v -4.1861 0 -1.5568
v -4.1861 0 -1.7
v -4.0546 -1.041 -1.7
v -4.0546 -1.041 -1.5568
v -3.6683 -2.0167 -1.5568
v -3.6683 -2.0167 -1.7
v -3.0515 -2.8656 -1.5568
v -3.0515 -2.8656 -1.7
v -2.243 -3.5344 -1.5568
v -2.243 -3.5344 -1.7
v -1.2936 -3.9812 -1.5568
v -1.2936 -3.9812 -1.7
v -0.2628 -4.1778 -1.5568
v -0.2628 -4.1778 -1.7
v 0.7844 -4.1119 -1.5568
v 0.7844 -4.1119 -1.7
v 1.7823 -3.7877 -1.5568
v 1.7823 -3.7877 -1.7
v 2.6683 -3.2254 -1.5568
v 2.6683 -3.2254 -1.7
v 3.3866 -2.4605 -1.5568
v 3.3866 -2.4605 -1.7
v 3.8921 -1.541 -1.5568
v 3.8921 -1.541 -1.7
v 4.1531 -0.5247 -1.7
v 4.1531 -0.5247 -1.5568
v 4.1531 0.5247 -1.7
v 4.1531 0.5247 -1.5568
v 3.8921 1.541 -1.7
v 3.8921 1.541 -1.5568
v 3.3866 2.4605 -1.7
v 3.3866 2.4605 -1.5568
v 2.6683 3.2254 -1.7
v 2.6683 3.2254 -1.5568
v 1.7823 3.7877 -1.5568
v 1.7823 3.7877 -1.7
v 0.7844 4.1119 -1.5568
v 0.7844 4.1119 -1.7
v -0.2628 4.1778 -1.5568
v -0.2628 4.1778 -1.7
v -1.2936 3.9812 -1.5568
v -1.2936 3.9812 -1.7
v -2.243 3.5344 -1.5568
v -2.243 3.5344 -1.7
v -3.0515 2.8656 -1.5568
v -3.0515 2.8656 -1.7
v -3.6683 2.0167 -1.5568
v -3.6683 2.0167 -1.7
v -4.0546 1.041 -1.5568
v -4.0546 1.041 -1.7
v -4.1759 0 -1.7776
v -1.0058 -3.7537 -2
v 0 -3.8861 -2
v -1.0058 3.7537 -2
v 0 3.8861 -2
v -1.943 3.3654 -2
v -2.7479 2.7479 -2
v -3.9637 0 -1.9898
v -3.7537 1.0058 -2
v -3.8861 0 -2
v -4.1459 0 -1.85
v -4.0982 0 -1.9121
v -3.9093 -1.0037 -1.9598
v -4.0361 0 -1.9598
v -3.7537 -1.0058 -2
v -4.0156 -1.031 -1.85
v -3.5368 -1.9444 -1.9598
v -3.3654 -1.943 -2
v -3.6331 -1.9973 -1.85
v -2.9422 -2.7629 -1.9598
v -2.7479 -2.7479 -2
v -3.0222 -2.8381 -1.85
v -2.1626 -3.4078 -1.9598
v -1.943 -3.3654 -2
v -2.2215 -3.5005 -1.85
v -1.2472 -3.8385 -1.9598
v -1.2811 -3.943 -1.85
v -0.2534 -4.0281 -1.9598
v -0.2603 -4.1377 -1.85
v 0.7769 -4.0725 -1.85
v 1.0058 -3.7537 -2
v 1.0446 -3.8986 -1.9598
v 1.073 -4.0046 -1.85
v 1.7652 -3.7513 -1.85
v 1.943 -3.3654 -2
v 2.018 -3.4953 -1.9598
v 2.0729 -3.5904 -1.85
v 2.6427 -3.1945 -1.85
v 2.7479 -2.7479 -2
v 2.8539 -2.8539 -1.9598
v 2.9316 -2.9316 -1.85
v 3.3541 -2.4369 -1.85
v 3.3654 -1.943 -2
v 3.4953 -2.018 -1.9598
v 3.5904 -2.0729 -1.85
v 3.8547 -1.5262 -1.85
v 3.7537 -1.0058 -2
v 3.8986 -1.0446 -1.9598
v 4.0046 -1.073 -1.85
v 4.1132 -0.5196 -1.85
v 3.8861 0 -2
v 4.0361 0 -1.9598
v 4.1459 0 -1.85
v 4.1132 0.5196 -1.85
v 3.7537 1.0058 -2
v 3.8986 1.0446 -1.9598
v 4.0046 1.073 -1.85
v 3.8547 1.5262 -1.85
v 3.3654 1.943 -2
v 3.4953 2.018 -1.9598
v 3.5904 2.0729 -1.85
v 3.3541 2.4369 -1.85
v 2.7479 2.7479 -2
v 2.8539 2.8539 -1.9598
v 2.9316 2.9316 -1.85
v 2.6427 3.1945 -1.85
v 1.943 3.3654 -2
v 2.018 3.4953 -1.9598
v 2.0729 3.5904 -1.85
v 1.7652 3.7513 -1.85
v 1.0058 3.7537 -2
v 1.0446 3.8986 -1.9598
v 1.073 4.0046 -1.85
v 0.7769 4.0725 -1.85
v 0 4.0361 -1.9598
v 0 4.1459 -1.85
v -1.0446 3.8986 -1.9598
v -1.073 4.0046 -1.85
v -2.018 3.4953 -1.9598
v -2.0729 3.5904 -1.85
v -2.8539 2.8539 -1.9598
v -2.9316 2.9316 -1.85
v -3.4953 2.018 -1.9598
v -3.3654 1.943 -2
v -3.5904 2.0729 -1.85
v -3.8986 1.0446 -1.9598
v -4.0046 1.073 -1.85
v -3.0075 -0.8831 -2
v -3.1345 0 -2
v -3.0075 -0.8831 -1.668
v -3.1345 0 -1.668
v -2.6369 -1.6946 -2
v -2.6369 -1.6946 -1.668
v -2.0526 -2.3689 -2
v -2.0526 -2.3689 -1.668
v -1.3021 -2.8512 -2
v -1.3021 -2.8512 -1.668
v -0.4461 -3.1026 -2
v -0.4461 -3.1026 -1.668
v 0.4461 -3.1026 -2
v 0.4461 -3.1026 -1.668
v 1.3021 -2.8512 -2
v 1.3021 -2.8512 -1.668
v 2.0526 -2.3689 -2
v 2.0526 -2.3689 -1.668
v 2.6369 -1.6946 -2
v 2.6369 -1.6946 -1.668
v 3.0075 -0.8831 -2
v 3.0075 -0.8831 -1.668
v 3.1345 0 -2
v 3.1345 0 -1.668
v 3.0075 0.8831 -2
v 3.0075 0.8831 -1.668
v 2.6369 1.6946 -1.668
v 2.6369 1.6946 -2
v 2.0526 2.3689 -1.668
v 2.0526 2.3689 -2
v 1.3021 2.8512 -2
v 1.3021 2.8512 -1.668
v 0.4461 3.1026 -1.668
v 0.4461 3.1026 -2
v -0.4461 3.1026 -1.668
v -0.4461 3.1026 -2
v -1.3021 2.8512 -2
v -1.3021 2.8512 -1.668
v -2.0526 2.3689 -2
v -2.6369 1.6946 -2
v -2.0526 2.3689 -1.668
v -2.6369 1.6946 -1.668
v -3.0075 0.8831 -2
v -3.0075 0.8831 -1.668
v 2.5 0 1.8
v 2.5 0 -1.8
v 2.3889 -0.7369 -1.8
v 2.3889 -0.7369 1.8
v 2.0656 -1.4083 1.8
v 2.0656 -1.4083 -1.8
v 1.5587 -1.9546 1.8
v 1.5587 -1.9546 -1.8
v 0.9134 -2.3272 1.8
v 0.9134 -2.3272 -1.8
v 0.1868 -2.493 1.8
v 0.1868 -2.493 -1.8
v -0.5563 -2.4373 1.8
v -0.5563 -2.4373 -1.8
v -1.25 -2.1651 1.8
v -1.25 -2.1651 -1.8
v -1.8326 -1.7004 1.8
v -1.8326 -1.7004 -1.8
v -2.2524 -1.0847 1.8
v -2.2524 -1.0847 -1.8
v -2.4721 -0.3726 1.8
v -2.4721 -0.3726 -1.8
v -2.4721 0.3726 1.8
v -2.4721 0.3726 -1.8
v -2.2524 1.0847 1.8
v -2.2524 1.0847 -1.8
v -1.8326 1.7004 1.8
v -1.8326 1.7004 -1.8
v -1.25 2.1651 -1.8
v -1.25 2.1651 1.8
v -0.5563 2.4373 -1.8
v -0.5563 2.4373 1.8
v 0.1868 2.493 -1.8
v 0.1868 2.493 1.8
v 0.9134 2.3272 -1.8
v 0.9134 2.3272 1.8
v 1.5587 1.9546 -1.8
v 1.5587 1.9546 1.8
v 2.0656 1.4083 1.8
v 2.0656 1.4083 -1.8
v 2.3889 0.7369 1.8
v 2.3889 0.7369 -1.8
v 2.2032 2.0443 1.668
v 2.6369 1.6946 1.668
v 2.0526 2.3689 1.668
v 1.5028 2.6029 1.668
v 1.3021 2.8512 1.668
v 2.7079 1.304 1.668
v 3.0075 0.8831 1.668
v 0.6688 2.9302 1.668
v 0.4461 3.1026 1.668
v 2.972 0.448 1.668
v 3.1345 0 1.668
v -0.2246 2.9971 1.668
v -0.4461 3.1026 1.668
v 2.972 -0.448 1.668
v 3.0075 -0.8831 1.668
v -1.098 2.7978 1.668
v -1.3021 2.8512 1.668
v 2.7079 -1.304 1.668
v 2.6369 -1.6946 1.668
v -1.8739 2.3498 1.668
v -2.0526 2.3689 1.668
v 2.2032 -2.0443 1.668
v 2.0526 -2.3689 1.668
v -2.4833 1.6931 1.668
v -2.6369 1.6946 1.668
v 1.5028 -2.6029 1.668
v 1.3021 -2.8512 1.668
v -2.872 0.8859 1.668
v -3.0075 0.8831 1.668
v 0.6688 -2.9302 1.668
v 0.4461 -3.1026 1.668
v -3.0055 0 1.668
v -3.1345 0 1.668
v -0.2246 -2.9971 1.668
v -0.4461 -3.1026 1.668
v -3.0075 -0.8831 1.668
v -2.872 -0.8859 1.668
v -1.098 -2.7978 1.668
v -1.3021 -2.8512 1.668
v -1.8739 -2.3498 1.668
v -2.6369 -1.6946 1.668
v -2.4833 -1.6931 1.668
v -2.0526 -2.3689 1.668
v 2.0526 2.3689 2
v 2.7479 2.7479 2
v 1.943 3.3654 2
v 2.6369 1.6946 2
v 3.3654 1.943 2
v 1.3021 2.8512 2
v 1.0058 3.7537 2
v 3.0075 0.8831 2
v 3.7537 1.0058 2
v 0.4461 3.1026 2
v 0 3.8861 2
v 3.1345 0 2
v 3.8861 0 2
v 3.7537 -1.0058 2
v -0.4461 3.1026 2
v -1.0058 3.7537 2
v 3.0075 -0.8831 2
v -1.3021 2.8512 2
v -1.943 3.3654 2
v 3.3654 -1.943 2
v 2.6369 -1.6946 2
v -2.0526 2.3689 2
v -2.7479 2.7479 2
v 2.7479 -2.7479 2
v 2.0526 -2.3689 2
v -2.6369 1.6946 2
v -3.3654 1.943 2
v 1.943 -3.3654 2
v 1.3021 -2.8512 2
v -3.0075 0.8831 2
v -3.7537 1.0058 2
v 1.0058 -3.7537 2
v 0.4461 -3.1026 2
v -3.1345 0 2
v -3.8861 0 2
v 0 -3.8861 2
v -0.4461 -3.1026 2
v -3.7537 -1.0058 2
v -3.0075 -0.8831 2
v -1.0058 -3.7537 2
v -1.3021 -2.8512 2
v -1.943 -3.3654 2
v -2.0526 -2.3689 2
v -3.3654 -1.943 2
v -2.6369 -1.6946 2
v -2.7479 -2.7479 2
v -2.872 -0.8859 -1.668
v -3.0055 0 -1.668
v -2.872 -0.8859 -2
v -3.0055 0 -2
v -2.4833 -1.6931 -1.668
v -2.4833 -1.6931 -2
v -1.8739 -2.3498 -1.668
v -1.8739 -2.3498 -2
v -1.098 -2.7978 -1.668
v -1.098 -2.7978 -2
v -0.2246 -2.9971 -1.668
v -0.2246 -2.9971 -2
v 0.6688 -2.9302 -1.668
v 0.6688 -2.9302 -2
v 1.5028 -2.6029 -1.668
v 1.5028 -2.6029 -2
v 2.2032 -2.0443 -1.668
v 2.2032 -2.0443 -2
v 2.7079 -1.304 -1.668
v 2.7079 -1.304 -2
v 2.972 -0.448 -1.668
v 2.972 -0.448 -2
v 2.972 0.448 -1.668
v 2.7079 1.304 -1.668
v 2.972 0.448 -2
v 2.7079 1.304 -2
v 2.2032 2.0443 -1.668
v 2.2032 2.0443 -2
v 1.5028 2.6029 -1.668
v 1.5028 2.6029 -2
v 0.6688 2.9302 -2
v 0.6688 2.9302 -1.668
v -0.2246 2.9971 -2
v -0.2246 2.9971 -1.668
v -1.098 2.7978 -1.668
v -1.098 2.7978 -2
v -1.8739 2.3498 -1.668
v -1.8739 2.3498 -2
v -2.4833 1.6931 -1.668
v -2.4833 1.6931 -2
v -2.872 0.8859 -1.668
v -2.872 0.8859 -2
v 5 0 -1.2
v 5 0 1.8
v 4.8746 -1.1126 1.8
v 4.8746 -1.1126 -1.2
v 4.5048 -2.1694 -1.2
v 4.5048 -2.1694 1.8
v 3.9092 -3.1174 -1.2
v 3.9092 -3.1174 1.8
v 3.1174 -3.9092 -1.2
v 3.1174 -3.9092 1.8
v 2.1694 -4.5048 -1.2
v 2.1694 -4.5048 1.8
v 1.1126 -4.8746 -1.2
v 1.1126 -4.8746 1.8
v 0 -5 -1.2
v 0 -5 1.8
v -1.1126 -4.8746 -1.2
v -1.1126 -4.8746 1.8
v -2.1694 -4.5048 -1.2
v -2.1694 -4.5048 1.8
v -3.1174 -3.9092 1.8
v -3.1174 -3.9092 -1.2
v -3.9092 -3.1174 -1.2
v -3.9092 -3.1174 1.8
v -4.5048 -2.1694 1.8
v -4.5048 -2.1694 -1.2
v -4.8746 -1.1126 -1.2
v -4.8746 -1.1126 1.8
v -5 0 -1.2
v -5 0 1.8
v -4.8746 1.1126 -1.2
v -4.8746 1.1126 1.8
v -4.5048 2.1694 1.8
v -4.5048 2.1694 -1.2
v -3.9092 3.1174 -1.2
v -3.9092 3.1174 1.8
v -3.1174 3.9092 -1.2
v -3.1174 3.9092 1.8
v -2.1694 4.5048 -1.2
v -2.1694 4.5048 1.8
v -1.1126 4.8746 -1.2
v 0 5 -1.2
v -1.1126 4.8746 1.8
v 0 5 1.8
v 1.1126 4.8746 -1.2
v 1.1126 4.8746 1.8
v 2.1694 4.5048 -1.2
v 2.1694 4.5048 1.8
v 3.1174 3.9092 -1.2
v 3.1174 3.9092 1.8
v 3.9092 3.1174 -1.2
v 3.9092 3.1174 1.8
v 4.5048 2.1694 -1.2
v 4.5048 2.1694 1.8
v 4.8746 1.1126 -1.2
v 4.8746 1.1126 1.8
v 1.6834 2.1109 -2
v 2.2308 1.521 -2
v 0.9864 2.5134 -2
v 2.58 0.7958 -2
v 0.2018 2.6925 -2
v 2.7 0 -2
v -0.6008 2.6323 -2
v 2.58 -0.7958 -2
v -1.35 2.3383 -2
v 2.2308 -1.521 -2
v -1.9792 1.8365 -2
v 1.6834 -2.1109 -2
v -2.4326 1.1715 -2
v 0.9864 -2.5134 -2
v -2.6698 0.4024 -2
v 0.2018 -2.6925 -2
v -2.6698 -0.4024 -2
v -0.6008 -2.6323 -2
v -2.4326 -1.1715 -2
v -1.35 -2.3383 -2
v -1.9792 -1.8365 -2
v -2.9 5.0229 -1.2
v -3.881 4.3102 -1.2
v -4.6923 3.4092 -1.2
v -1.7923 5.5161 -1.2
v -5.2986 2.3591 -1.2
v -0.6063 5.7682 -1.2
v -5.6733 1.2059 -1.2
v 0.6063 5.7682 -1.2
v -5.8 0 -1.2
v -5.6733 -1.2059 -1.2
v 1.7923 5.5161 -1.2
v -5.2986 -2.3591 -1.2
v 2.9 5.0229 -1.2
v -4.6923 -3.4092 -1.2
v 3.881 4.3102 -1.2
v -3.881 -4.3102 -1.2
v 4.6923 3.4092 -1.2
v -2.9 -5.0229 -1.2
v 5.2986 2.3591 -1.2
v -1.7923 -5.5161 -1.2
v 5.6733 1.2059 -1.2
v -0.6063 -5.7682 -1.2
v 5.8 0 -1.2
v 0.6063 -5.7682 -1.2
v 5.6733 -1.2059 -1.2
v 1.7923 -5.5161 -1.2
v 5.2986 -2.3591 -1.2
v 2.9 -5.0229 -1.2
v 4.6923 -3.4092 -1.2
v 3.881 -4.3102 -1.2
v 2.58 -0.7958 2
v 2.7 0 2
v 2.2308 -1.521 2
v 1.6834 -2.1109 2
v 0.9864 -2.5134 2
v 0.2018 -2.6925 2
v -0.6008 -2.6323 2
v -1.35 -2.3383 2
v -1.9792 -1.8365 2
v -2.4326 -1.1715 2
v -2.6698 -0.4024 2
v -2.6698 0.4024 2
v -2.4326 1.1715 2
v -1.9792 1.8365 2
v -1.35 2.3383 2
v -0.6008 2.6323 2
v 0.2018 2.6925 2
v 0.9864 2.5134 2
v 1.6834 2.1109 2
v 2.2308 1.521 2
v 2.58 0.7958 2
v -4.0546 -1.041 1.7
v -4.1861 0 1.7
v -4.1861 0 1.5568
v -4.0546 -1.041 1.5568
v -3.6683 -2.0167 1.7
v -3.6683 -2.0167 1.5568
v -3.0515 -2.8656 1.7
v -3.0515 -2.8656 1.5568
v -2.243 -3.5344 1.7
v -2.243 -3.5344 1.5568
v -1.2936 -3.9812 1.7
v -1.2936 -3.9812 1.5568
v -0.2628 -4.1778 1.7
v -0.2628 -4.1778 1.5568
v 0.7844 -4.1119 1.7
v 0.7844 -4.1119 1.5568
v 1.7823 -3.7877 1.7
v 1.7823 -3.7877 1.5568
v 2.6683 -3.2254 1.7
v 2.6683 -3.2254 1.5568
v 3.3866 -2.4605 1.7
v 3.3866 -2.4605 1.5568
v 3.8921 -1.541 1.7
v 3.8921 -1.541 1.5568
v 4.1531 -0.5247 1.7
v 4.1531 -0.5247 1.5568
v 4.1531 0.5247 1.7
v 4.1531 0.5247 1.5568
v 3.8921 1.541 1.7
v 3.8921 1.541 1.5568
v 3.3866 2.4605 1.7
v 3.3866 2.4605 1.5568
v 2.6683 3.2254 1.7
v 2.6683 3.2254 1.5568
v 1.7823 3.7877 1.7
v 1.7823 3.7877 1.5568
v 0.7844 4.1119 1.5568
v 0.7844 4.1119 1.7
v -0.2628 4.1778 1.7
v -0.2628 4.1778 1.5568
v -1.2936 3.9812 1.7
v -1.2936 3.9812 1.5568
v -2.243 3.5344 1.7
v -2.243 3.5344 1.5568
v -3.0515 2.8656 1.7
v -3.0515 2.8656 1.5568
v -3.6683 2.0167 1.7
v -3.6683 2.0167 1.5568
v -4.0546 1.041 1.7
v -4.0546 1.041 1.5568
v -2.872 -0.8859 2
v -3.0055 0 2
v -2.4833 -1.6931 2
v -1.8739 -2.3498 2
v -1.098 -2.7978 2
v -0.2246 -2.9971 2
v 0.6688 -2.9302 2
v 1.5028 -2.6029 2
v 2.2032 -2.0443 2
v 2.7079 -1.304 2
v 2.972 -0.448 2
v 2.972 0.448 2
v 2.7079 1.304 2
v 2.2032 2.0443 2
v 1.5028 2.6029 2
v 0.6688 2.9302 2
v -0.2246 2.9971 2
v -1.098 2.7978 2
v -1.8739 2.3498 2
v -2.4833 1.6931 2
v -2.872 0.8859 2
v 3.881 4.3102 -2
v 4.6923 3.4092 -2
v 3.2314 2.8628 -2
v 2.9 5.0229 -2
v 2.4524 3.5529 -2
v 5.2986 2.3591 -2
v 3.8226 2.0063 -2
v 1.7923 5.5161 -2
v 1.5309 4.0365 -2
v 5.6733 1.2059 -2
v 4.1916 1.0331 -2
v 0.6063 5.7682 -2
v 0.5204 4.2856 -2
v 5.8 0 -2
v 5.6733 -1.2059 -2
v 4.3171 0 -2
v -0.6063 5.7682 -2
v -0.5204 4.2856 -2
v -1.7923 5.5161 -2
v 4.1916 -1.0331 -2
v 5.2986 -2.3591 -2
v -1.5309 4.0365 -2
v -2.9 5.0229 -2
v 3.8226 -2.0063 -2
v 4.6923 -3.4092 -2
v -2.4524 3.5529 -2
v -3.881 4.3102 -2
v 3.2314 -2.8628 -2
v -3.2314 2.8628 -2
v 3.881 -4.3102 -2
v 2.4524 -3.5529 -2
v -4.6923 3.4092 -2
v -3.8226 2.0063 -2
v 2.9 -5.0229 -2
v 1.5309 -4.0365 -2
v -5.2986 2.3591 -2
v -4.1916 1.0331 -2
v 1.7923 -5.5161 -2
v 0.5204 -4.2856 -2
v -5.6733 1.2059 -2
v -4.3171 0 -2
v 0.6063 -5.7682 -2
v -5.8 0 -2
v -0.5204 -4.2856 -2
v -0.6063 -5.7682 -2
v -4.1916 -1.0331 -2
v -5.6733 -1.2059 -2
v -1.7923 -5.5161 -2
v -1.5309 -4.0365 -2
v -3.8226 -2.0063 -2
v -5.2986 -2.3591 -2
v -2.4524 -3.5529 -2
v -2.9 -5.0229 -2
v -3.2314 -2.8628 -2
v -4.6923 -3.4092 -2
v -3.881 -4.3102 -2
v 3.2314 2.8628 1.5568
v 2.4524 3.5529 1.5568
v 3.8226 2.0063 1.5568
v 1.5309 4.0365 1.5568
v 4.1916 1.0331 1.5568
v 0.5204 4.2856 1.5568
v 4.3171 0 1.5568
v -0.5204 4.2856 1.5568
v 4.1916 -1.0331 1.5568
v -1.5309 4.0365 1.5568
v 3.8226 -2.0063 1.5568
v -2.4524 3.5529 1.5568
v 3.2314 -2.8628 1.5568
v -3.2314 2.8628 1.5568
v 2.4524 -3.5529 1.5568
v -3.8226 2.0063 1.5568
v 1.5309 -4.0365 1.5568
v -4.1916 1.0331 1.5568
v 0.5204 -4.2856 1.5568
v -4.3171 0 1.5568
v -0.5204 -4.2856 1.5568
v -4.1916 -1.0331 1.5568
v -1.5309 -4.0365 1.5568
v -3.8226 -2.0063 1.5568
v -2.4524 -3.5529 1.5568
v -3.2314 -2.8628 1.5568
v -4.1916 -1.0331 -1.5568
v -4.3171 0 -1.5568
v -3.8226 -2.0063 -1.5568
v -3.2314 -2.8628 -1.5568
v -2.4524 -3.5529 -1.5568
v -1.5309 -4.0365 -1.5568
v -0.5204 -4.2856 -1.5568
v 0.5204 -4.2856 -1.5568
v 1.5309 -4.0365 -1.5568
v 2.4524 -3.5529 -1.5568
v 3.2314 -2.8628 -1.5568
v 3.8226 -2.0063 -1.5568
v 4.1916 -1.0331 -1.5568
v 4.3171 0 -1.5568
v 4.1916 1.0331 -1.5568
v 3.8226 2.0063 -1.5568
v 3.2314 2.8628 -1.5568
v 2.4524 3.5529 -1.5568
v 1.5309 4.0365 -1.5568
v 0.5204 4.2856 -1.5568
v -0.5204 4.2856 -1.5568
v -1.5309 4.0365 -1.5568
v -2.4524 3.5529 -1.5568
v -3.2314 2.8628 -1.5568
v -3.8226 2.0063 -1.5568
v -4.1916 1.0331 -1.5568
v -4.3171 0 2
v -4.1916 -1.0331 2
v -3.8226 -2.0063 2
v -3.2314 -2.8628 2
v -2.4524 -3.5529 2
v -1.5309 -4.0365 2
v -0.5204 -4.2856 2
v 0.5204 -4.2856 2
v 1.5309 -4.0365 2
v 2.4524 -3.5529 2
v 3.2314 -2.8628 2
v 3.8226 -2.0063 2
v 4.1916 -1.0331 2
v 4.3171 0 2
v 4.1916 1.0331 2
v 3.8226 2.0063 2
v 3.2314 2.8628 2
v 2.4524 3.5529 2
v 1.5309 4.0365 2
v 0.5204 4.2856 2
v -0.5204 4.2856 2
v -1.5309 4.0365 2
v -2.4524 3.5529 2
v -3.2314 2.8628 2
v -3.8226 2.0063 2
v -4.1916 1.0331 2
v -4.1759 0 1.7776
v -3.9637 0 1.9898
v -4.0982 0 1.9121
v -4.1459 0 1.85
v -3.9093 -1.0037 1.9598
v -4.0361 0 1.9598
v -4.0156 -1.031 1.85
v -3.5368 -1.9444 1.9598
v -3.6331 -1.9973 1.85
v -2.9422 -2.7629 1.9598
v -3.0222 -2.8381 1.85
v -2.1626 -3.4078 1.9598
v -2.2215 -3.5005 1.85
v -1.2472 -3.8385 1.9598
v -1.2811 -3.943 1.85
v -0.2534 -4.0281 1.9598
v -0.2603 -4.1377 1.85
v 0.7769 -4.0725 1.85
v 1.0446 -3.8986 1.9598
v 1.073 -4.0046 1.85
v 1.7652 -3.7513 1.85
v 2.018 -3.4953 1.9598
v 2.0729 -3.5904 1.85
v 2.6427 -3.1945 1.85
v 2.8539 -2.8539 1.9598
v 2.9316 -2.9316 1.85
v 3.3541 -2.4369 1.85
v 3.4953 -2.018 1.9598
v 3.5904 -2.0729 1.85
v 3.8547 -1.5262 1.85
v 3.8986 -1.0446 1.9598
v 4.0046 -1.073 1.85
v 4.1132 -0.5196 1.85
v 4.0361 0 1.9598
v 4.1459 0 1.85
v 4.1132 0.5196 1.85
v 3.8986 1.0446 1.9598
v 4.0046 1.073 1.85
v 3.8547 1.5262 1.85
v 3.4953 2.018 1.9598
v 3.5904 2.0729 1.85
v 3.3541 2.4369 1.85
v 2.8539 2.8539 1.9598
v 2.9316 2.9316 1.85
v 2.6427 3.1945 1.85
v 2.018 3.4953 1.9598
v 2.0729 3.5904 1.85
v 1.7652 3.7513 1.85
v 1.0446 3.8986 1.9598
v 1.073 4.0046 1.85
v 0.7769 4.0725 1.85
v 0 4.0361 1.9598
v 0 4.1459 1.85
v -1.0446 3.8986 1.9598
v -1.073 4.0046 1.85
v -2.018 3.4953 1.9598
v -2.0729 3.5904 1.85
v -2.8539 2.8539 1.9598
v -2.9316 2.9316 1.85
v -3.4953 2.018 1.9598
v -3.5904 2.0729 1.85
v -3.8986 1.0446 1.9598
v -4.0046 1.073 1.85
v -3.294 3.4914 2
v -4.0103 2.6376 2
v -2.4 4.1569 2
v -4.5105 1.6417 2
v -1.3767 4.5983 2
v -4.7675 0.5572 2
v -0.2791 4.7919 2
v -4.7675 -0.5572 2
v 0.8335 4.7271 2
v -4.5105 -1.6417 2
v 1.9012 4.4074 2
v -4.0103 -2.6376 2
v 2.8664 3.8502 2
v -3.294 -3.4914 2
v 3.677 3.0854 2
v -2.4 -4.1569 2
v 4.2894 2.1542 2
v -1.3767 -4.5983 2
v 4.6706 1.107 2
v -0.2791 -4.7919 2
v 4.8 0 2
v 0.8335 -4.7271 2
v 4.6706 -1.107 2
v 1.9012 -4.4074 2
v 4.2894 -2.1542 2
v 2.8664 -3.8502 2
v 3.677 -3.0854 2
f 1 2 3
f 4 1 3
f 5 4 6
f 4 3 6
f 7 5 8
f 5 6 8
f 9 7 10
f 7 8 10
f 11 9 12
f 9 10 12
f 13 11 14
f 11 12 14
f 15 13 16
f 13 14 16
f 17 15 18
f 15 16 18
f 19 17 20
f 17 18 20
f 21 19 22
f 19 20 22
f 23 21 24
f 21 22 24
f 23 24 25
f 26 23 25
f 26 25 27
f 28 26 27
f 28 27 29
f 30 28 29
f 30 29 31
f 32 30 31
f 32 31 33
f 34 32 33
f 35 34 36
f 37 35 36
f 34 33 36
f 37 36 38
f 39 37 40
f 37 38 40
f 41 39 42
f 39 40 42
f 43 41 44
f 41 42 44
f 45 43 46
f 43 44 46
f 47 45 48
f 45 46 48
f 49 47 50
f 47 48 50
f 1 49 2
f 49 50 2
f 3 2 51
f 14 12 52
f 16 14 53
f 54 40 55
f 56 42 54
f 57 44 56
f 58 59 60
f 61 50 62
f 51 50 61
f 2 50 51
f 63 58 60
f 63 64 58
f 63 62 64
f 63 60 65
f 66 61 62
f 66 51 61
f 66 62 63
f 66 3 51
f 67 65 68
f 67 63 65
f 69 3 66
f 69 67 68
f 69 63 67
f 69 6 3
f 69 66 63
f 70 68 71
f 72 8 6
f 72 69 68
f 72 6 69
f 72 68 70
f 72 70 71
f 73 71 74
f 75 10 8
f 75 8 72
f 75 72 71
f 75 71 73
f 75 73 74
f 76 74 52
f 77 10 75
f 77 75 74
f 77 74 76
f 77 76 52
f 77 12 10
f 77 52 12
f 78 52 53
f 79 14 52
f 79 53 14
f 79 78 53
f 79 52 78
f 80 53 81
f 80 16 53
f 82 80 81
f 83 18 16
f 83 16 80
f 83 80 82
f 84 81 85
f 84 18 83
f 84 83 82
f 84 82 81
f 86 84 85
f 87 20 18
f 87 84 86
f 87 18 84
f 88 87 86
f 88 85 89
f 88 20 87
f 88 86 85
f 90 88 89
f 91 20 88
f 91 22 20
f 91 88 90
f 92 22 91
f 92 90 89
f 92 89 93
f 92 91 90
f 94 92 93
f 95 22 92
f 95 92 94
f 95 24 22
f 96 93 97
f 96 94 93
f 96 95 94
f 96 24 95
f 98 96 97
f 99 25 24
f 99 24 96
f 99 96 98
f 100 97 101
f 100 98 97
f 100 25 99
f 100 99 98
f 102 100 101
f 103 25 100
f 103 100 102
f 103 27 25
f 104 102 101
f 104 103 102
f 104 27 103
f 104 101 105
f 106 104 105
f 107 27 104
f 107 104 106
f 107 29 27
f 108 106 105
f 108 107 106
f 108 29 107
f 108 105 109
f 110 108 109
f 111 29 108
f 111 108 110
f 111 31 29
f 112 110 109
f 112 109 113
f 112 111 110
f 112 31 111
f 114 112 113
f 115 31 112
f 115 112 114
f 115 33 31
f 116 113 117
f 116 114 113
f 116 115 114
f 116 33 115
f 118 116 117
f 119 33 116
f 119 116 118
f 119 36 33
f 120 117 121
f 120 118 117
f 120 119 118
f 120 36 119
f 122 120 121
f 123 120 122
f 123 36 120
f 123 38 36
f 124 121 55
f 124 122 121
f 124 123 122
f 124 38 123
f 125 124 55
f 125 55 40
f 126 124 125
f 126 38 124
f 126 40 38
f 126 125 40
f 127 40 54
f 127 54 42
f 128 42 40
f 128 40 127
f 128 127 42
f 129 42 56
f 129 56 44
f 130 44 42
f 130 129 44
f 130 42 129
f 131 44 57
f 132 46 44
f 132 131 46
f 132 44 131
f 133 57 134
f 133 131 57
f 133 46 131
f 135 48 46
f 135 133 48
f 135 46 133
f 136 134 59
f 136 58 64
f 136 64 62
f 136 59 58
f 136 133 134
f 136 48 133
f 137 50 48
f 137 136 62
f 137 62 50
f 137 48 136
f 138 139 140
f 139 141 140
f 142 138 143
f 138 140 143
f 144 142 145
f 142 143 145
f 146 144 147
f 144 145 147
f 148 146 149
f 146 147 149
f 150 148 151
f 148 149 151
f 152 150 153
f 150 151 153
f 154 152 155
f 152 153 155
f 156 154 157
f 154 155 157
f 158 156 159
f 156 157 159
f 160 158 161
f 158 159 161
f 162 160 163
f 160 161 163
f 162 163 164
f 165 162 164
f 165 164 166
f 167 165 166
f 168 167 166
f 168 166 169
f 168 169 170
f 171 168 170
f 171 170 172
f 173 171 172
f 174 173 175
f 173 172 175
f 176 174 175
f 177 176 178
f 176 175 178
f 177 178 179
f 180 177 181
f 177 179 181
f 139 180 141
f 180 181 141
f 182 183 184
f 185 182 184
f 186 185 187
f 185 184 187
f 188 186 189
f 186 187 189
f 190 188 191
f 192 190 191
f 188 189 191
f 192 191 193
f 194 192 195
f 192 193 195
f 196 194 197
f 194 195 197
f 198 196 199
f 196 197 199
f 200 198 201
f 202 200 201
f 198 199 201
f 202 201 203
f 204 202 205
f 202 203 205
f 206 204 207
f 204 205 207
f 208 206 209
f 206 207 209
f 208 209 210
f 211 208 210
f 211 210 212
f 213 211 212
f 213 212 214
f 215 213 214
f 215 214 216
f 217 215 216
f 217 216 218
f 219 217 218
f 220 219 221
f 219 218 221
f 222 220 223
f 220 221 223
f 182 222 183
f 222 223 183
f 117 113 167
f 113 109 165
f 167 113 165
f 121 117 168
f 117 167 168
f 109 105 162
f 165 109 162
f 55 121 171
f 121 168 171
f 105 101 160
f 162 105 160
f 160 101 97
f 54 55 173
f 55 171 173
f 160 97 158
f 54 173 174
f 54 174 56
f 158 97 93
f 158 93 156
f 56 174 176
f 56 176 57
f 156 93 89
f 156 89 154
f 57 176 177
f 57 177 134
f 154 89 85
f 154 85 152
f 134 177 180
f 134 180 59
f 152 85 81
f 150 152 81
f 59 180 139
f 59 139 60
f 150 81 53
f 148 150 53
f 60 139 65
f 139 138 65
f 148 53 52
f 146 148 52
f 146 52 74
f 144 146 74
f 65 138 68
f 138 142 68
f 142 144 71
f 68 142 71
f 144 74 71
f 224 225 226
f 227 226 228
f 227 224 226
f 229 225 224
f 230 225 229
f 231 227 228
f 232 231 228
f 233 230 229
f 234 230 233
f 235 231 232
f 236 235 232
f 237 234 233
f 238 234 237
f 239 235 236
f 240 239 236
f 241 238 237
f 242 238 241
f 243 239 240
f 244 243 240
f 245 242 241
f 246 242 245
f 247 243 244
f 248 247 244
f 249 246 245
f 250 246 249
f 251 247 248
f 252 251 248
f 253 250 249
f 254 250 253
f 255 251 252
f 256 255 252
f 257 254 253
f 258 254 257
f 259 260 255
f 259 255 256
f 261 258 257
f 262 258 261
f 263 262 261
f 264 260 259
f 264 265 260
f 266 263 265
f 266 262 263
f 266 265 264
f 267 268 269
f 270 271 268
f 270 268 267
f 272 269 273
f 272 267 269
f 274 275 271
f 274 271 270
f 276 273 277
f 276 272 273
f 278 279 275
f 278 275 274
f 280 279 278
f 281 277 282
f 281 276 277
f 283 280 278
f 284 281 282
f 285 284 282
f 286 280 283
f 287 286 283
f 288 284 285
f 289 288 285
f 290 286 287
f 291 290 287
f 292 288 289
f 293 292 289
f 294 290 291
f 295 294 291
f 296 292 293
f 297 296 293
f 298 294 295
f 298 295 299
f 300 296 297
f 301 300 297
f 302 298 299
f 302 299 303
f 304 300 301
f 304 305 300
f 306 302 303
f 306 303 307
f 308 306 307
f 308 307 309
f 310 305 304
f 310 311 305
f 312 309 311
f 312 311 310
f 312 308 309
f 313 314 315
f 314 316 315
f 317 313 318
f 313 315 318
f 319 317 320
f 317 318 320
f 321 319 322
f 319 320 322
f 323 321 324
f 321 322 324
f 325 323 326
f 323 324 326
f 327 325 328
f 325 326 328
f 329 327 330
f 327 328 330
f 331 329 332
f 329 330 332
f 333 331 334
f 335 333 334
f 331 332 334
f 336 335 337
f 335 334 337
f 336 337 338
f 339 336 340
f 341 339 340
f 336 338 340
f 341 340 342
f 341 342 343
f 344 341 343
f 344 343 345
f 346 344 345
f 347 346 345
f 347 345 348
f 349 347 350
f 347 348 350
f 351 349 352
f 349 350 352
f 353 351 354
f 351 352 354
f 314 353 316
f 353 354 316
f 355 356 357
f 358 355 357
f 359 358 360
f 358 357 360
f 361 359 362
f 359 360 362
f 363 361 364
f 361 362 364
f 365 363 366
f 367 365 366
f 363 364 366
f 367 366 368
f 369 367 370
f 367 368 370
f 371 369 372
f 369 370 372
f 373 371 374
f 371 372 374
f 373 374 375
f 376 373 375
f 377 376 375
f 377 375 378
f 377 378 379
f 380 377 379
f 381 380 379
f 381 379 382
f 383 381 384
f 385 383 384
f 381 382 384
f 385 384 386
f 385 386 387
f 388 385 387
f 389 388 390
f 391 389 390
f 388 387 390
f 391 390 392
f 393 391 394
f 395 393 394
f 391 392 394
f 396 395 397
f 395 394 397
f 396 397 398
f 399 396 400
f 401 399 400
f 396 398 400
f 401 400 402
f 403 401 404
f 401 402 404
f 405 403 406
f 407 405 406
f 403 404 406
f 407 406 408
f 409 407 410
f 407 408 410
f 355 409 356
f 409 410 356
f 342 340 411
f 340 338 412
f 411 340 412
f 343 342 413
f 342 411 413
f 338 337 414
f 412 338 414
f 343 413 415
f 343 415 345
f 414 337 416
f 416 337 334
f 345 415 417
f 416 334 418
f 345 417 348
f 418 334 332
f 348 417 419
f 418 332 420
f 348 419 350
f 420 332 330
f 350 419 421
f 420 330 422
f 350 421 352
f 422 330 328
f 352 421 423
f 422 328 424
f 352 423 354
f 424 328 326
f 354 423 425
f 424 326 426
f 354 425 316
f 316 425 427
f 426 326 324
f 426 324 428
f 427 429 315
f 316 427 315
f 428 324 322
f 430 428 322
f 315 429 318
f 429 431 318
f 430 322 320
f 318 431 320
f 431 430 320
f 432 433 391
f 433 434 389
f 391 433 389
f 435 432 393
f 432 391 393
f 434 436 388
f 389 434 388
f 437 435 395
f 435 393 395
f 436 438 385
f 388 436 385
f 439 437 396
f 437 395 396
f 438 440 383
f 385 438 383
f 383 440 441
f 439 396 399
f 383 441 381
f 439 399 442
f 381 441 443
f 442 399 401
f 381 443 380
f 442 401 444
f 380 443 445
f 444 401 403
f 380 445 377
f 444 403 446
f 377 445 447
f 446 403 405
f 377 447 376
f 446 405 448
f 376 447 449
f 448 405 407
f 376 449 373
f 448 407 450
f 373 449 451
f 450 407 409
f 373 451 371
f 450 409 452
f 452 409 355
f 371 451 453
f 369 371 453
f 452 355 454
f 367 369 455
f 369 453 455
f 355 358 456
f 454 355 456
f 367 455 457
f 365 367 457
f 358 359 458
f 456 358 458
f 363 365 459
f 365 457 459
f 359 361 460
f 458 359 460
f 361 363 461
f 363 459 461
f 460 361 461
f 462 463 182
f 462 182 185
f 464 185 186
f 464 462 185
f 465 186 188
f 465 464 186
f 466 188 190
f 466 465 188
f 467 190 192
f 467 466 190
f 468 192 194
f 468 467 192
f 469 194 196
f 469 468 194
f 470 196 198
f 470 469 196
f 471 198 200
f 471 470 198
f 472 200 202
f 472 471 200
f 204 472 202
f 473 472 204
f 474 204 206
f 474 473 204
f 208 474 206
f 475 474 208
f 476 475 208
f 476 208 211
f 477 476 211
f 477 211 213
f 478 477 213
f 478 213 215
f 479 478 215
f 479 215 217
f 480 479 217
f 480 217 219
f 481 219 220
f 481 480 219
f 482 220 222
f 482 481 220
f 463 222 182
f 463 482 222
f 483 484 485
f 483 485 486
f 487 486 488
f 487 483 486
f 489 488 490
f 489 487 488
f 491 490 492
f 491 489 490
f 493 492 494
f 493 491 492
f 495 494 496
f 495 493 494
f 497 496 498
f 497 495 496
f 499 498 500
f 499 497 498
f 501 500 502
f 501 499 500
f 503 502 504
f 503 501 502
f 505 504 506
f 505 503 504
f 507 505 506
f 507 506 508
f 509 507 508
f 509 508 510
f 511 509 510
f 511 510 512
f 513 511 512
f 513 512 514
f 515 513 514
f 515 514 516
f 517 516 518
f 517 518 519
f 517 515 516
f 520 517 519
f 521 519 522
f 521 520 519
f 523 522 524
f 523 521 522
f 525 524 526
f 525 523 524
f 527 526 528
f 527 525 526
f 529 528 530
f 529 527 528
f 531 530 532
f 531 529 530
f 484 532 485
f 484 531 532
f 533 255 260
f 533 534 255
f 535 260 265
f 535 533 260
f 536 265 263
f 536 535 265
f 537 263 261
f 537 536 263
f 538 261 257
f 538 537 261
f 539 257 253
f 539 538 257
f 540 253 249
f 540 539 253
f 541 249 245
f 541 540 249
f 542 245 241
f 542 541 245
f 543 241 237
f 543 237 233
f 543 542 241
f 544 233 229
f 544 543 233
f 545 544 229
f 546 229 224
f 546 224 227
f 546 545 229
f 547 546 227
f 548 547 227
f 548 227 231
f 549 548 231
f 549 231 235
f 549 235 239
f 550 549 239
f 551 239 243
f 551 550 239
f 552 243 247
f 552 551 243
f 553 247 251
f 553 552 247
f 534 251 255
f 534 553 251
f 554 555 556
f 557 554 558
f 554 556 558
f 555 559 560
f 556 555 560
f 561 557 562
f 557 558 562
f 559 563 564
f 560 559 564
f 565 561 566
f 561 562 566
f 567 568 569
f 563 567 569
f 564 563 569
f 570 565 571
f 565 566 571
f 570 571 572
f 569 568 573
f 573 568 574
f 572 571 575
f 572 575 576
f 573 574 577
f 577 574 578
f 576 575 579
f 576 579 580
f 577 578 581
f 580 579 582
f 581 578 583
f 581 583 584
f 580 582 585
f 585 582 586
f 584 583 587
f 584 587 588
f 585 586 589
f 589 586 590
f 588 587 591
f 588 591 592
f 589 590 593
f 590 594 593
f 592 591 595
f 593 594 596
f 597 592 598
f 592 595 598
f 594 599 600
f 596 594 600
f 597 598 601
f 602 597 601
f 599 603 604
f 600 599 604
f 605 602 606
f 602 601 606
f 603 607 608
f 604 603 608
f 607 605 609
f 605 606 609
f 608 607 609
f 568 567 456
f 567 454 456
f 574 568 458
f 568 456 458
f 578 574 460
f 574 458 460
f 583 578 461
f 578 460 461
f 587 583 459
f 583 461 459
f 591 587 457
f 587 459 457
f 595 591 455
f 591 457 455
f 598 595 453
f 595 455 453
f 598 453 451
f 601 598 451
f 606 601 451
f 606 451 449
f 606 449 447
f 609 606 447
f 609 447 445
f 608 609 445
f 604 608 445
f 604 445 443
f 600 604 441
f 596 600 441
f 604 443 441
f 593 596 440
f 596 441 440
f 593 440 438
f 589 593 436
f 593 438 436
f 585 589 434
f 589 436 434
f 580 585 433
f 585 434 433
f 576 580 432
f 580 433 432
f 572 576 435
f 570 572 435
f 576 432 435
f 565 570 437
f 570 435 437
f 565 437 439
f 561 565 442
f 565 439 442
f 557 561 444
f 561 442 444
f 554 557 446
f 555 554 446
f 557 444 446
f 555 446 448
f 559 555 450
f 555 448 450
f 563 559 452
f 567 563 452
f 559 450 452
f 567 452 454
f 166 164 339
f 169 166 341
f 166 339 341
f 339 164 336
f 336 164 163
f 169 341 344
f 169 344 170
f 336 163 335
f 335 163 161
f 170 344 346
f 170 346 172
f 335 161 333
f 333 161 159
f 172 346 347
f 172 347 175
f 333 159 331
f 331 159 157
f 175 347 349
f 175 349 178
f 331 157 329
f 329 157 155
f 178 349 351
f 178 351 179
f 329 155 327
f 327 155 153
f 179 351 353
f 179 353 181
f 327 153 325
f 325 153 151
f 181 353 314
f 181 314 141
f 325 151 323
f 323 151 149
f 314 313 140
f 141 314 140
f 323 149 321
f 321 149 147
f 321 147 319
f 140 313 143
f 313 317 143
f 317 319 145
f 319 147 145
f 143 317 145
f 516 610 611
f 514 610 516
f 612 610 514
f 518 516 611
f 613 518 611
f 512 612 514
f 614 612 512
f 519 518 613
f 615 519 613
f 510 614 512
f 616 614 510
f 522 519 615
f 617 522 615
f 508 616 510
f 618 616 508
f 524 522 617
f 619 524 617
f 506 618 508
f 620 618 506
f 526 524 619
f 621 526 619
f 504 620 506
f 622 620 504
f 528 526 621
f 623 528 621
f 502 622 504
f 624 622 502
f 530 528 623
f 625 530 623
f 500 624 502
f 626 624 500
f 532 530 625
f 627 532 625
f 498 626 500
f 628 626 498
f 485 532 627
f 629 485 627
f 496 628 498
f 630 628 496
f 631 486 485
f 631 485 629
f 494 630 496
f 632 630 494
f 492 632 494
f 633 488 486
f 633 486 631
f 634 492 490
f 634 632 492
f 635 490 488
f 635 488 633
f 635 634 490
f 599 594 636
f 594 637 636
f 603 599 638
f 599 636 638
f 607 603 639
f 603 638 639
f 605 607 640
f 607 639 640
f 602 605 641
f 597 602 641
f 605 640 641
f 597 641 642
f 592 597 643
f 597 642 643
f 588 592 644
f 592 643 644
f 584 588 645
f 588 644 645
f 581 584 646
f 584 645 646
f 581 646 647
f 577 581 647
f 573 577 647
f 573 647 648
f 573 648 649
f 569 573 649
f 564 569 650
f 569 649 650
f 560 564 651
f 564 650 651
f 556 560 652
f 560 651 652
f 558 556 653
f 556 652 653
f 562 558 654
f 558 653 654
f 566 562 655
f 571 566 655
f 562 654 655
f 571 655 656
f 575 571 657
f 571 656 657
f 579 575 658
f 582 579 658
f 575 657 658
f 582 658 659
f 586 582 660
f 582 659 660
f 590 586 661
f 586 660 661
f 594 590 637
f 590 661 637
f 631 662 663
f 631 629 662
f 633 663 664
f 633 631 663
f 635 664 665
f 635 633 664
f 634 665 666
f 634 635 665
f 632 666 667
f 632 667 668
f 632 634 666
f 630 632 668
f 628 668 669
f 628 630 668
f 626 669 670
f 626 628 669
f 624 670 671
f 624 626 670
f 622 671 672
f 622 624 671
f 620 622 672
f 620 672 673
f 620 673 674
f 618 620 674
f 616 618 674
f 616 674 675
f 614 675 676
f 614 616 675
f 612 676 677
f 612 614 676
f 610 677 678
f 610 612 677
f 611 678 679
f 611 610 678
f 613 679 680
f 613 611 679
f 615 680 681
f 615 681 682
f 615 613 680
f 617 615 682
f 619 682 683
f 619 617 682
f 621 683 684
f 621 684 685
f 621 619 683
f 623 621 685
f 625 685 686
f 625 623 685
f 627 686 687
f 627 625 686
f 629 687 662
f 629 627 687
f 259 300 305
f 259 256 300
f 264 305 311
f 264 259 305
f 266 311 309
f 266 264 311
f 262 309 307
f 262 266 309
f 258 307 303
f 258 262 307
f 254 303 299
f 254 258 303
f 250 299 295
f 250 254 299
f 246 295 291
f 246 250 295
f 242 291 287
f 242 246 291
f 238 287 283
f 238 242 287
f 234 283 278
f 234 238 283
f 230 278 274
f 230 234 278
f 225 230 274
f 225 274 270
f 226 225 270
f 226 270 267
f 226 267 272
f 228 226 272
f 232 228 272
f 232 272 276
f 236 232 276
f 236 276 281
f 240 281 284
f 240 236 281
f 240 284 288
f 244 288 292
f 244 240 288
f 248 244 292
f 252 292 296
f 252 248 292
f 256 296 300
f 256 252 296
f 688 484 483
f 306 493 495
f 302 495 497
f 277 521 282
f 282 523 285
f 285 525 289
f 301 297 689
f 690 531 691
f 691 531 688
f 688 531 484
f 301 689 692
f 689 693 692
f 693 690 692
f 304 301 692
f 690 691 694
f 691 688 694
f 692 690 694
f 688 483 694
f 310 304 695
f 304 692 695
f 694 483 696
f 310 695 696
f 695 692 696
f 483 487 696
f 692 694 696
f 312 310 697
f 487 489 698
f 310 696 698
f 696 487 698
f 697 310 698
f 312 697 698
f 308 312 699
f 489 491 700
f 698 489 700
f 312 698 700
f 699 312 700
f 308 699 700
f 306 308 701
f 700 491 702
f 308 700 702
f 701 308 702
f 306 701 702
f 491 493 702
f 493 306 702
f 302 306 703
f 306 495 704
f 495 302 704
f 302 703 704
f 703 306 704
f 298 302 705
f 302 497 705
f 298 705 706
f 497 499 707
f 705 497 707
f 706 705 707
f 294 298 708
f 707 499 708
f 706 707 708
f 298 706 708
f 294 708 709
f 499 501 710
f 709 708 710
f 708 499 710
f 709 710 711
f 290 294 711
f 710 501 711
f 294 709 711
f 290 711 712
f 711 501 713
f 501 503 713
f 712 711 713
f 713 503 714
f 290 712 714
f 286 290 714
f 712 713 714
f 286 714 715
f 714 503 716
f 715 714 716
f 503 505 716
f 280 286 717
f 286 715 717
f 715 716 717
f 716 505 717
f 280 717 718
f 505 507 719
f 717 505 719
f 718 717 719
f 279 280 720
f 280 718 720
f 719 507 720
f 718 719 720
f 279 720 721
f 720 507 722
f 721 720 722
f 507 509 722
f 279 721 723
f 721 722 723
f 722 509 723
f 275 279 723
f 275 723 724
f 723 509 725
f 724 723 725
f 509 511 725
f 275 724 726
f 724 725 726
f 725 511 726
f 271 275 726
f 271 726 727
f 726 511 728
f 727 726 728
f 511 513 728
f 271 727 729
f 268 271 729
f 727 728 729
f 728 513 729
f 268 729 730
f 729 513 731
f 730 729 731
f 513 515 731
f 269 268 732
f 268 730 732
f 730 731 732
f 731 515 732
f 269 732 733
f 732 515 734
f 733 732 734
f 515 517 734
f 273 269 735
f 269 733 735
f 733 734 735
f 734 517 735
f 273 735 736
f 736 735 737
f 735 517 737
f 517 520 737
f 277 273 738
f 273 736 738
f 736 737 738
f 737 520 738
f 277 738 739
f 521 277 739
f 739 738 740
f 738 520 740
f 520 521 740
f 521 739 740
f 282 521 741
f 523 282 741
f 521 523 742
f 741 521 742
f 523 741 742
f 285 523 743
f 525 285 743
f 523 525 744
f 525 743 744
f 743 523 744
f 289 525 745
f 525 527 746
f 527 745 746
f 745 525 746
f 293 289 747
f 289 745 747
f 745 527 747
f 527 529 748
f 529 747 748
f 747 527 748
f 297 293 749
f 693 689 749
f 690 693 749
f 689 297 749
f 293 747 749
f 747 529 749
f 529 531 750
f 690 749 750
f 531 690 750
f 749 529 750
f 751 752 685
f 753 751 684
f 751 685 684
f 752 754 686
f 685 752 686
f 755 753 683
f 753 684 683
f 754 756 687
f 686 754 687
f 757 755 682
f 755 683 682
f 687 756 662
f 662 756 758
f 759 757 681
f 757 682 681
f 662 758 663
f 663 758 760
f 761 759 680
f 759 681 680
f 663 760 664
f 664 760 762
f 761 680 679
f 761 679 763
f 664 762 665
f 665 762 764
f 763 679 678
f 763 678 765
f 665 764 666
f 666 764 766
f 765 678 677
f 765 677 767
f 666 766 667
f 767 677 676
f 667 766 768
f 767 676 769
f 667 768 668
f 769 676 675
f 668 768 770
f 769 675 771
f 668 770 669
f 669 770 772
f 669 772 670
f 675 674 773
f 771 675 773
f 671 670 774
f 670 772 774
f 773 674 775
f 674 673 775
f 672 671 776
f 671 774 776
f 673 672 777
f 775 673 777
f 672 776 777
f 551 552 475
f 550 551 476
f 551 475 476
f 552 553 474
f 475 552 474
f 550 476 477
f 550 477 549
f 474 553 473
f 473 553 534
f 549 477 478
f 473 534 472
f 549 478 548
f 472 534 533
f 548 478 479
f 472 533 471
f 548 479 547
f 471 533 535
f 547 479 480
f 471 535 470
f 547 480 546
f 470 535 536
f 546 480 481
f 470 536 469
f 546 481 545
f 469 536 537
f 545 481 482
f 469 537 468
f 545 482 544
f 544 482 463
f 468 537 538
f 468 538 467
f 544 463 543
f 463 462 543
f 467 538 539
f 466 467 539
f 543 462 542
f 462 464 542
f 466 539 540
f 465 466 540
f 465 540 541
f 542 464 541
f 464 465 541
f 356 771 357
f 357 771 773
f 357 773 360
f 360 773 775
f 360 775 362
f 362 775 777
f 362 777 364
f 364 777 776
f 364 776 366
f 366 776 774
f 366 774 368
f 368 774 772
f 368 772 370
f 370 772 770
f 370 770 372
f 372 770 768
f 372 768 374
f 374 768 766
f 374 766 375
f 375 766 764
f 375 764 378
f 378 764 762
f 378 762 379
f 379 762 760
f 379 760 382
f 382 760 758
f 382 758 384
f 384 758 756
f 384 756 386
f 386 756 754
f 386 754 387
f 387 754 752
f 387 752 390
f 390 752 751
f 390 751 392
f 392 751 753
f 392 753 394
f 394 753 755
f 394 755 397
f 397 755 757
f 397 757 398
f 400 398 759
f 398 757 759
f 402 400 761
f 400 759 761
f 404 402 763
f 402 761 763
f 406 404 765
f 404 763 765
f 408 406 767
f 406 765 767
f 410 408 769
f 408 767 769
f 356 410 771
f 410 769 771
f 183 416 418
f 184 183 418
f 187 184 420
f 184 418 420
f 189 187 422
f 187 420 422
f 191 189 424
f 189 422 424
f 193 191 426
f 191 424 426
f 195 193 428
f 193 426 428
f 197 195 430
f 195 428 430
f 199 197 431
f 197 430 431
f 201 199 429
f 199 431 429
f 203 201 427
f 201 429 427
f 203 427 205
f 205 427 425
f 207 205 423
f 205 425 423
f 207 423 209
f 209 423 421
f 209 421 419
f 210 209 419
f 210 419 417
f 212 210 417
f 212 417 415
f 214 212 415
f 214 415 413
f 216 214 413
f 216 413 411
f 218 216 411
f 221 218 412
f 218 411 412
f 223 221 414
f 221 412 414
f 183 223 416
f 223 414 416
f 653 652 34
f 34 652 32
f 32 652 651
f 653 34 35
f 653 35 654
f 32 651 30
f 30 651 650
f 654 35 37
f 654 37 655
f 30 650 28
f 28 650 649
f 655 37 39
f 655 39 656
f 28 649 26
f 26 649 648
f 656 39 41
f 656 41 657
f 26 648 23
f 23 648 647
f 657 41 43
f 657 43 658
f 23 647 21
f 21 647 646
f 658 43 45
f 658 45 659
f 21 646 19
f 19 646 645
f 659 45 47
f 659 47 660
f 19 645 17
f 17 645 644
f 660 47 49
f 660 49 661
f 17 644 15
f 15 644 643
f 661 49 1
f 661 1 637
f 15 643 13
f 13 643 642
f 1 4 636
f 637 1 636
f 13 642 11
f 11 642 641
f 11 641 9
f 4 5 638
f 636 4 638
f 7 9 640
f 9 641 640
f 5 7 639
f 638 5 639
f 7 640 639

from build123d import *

# Parameters (mm, degrees)
CHAMFER1_SIZE = 0.2
FILLET1_R     = 0.3


with BuildPart() as part:
    # Sketch1 → Revolve1 (revolve)
    with BuildSketch(Plane(origin=(0, 0, 0), x_dir=(0, 0, -1), z_dir=(1, 0, 0)), mode=Mode.PRIVATE) as revolve1_sk:
        Polygon((-2, 2.5), (2, 2.5), (2, 5.8), (1.2, 5.8), (1.2, 5), (-2, 5), align=None)
    revolve(revolve1_sk.sketch.rotate(Axis((0, 0, 0), (0, 0, -1)), 90), axis=Axis((0, 0, 0), (0, 0, -1)))

    # Chamfer1
    chamfer1_edges = [part.edges().sort_by_distance(p)[0] for p in [
        (-5, 0, 2),
        (-2.5, 0, -2),
        (-2.5, 0, 2),
    ]]
    chamfer(chamfer1_edges, length=CHAMFER1_SIZE)

    # Sketch2 → Cut-Revolve1 (revolve, cut)
    with BuildSketch(Plane(origin=(0, 0, 0), x_dir=(0, 0, -1), z_dir=(1, 0, 0)), mode=Mode.PRIVATE) as cut_revolve1_sk:
        Polygon((-2, 4.317089392), (-1.556756286, 4.317089392), (-1.556756286, 4.186077714), (-2, 4.186077714), (-2, 3.134478417), (-1.668024824, 3.134478417), (-1.668024824, 3.005528354), (-2, 3.005528354), (-2, 2.264675566), (-2.552130355, 2.264675566), (-2.552130355, 4.329651261), (-2, 4.329651261), align=None)
    cut_revolve1 = revolve(cut_revolve1_sk.sketch.rotate(Axis((0, 0, -2), (0, 0, 1)), 90), axis=Axis((0, 0, -2), (0, 0, 1)), mode=Mode.SUBTRACT)

    # Mirror3: Cut-Revolve1 across plane
    add(cut_revolve1.mirror(Plane.XY), mode=Mode.SUBTRACT)

    # Fillet1
    fillet1_edges = [part.edges().sort_by_distance(p)[0] for p in [
        (4.186077714, 0, 2),
        (4.186077714, 0, -2),
    ]]
    fillet(fillet1_edges, radius=FILLET1_R)


solid = part.part
